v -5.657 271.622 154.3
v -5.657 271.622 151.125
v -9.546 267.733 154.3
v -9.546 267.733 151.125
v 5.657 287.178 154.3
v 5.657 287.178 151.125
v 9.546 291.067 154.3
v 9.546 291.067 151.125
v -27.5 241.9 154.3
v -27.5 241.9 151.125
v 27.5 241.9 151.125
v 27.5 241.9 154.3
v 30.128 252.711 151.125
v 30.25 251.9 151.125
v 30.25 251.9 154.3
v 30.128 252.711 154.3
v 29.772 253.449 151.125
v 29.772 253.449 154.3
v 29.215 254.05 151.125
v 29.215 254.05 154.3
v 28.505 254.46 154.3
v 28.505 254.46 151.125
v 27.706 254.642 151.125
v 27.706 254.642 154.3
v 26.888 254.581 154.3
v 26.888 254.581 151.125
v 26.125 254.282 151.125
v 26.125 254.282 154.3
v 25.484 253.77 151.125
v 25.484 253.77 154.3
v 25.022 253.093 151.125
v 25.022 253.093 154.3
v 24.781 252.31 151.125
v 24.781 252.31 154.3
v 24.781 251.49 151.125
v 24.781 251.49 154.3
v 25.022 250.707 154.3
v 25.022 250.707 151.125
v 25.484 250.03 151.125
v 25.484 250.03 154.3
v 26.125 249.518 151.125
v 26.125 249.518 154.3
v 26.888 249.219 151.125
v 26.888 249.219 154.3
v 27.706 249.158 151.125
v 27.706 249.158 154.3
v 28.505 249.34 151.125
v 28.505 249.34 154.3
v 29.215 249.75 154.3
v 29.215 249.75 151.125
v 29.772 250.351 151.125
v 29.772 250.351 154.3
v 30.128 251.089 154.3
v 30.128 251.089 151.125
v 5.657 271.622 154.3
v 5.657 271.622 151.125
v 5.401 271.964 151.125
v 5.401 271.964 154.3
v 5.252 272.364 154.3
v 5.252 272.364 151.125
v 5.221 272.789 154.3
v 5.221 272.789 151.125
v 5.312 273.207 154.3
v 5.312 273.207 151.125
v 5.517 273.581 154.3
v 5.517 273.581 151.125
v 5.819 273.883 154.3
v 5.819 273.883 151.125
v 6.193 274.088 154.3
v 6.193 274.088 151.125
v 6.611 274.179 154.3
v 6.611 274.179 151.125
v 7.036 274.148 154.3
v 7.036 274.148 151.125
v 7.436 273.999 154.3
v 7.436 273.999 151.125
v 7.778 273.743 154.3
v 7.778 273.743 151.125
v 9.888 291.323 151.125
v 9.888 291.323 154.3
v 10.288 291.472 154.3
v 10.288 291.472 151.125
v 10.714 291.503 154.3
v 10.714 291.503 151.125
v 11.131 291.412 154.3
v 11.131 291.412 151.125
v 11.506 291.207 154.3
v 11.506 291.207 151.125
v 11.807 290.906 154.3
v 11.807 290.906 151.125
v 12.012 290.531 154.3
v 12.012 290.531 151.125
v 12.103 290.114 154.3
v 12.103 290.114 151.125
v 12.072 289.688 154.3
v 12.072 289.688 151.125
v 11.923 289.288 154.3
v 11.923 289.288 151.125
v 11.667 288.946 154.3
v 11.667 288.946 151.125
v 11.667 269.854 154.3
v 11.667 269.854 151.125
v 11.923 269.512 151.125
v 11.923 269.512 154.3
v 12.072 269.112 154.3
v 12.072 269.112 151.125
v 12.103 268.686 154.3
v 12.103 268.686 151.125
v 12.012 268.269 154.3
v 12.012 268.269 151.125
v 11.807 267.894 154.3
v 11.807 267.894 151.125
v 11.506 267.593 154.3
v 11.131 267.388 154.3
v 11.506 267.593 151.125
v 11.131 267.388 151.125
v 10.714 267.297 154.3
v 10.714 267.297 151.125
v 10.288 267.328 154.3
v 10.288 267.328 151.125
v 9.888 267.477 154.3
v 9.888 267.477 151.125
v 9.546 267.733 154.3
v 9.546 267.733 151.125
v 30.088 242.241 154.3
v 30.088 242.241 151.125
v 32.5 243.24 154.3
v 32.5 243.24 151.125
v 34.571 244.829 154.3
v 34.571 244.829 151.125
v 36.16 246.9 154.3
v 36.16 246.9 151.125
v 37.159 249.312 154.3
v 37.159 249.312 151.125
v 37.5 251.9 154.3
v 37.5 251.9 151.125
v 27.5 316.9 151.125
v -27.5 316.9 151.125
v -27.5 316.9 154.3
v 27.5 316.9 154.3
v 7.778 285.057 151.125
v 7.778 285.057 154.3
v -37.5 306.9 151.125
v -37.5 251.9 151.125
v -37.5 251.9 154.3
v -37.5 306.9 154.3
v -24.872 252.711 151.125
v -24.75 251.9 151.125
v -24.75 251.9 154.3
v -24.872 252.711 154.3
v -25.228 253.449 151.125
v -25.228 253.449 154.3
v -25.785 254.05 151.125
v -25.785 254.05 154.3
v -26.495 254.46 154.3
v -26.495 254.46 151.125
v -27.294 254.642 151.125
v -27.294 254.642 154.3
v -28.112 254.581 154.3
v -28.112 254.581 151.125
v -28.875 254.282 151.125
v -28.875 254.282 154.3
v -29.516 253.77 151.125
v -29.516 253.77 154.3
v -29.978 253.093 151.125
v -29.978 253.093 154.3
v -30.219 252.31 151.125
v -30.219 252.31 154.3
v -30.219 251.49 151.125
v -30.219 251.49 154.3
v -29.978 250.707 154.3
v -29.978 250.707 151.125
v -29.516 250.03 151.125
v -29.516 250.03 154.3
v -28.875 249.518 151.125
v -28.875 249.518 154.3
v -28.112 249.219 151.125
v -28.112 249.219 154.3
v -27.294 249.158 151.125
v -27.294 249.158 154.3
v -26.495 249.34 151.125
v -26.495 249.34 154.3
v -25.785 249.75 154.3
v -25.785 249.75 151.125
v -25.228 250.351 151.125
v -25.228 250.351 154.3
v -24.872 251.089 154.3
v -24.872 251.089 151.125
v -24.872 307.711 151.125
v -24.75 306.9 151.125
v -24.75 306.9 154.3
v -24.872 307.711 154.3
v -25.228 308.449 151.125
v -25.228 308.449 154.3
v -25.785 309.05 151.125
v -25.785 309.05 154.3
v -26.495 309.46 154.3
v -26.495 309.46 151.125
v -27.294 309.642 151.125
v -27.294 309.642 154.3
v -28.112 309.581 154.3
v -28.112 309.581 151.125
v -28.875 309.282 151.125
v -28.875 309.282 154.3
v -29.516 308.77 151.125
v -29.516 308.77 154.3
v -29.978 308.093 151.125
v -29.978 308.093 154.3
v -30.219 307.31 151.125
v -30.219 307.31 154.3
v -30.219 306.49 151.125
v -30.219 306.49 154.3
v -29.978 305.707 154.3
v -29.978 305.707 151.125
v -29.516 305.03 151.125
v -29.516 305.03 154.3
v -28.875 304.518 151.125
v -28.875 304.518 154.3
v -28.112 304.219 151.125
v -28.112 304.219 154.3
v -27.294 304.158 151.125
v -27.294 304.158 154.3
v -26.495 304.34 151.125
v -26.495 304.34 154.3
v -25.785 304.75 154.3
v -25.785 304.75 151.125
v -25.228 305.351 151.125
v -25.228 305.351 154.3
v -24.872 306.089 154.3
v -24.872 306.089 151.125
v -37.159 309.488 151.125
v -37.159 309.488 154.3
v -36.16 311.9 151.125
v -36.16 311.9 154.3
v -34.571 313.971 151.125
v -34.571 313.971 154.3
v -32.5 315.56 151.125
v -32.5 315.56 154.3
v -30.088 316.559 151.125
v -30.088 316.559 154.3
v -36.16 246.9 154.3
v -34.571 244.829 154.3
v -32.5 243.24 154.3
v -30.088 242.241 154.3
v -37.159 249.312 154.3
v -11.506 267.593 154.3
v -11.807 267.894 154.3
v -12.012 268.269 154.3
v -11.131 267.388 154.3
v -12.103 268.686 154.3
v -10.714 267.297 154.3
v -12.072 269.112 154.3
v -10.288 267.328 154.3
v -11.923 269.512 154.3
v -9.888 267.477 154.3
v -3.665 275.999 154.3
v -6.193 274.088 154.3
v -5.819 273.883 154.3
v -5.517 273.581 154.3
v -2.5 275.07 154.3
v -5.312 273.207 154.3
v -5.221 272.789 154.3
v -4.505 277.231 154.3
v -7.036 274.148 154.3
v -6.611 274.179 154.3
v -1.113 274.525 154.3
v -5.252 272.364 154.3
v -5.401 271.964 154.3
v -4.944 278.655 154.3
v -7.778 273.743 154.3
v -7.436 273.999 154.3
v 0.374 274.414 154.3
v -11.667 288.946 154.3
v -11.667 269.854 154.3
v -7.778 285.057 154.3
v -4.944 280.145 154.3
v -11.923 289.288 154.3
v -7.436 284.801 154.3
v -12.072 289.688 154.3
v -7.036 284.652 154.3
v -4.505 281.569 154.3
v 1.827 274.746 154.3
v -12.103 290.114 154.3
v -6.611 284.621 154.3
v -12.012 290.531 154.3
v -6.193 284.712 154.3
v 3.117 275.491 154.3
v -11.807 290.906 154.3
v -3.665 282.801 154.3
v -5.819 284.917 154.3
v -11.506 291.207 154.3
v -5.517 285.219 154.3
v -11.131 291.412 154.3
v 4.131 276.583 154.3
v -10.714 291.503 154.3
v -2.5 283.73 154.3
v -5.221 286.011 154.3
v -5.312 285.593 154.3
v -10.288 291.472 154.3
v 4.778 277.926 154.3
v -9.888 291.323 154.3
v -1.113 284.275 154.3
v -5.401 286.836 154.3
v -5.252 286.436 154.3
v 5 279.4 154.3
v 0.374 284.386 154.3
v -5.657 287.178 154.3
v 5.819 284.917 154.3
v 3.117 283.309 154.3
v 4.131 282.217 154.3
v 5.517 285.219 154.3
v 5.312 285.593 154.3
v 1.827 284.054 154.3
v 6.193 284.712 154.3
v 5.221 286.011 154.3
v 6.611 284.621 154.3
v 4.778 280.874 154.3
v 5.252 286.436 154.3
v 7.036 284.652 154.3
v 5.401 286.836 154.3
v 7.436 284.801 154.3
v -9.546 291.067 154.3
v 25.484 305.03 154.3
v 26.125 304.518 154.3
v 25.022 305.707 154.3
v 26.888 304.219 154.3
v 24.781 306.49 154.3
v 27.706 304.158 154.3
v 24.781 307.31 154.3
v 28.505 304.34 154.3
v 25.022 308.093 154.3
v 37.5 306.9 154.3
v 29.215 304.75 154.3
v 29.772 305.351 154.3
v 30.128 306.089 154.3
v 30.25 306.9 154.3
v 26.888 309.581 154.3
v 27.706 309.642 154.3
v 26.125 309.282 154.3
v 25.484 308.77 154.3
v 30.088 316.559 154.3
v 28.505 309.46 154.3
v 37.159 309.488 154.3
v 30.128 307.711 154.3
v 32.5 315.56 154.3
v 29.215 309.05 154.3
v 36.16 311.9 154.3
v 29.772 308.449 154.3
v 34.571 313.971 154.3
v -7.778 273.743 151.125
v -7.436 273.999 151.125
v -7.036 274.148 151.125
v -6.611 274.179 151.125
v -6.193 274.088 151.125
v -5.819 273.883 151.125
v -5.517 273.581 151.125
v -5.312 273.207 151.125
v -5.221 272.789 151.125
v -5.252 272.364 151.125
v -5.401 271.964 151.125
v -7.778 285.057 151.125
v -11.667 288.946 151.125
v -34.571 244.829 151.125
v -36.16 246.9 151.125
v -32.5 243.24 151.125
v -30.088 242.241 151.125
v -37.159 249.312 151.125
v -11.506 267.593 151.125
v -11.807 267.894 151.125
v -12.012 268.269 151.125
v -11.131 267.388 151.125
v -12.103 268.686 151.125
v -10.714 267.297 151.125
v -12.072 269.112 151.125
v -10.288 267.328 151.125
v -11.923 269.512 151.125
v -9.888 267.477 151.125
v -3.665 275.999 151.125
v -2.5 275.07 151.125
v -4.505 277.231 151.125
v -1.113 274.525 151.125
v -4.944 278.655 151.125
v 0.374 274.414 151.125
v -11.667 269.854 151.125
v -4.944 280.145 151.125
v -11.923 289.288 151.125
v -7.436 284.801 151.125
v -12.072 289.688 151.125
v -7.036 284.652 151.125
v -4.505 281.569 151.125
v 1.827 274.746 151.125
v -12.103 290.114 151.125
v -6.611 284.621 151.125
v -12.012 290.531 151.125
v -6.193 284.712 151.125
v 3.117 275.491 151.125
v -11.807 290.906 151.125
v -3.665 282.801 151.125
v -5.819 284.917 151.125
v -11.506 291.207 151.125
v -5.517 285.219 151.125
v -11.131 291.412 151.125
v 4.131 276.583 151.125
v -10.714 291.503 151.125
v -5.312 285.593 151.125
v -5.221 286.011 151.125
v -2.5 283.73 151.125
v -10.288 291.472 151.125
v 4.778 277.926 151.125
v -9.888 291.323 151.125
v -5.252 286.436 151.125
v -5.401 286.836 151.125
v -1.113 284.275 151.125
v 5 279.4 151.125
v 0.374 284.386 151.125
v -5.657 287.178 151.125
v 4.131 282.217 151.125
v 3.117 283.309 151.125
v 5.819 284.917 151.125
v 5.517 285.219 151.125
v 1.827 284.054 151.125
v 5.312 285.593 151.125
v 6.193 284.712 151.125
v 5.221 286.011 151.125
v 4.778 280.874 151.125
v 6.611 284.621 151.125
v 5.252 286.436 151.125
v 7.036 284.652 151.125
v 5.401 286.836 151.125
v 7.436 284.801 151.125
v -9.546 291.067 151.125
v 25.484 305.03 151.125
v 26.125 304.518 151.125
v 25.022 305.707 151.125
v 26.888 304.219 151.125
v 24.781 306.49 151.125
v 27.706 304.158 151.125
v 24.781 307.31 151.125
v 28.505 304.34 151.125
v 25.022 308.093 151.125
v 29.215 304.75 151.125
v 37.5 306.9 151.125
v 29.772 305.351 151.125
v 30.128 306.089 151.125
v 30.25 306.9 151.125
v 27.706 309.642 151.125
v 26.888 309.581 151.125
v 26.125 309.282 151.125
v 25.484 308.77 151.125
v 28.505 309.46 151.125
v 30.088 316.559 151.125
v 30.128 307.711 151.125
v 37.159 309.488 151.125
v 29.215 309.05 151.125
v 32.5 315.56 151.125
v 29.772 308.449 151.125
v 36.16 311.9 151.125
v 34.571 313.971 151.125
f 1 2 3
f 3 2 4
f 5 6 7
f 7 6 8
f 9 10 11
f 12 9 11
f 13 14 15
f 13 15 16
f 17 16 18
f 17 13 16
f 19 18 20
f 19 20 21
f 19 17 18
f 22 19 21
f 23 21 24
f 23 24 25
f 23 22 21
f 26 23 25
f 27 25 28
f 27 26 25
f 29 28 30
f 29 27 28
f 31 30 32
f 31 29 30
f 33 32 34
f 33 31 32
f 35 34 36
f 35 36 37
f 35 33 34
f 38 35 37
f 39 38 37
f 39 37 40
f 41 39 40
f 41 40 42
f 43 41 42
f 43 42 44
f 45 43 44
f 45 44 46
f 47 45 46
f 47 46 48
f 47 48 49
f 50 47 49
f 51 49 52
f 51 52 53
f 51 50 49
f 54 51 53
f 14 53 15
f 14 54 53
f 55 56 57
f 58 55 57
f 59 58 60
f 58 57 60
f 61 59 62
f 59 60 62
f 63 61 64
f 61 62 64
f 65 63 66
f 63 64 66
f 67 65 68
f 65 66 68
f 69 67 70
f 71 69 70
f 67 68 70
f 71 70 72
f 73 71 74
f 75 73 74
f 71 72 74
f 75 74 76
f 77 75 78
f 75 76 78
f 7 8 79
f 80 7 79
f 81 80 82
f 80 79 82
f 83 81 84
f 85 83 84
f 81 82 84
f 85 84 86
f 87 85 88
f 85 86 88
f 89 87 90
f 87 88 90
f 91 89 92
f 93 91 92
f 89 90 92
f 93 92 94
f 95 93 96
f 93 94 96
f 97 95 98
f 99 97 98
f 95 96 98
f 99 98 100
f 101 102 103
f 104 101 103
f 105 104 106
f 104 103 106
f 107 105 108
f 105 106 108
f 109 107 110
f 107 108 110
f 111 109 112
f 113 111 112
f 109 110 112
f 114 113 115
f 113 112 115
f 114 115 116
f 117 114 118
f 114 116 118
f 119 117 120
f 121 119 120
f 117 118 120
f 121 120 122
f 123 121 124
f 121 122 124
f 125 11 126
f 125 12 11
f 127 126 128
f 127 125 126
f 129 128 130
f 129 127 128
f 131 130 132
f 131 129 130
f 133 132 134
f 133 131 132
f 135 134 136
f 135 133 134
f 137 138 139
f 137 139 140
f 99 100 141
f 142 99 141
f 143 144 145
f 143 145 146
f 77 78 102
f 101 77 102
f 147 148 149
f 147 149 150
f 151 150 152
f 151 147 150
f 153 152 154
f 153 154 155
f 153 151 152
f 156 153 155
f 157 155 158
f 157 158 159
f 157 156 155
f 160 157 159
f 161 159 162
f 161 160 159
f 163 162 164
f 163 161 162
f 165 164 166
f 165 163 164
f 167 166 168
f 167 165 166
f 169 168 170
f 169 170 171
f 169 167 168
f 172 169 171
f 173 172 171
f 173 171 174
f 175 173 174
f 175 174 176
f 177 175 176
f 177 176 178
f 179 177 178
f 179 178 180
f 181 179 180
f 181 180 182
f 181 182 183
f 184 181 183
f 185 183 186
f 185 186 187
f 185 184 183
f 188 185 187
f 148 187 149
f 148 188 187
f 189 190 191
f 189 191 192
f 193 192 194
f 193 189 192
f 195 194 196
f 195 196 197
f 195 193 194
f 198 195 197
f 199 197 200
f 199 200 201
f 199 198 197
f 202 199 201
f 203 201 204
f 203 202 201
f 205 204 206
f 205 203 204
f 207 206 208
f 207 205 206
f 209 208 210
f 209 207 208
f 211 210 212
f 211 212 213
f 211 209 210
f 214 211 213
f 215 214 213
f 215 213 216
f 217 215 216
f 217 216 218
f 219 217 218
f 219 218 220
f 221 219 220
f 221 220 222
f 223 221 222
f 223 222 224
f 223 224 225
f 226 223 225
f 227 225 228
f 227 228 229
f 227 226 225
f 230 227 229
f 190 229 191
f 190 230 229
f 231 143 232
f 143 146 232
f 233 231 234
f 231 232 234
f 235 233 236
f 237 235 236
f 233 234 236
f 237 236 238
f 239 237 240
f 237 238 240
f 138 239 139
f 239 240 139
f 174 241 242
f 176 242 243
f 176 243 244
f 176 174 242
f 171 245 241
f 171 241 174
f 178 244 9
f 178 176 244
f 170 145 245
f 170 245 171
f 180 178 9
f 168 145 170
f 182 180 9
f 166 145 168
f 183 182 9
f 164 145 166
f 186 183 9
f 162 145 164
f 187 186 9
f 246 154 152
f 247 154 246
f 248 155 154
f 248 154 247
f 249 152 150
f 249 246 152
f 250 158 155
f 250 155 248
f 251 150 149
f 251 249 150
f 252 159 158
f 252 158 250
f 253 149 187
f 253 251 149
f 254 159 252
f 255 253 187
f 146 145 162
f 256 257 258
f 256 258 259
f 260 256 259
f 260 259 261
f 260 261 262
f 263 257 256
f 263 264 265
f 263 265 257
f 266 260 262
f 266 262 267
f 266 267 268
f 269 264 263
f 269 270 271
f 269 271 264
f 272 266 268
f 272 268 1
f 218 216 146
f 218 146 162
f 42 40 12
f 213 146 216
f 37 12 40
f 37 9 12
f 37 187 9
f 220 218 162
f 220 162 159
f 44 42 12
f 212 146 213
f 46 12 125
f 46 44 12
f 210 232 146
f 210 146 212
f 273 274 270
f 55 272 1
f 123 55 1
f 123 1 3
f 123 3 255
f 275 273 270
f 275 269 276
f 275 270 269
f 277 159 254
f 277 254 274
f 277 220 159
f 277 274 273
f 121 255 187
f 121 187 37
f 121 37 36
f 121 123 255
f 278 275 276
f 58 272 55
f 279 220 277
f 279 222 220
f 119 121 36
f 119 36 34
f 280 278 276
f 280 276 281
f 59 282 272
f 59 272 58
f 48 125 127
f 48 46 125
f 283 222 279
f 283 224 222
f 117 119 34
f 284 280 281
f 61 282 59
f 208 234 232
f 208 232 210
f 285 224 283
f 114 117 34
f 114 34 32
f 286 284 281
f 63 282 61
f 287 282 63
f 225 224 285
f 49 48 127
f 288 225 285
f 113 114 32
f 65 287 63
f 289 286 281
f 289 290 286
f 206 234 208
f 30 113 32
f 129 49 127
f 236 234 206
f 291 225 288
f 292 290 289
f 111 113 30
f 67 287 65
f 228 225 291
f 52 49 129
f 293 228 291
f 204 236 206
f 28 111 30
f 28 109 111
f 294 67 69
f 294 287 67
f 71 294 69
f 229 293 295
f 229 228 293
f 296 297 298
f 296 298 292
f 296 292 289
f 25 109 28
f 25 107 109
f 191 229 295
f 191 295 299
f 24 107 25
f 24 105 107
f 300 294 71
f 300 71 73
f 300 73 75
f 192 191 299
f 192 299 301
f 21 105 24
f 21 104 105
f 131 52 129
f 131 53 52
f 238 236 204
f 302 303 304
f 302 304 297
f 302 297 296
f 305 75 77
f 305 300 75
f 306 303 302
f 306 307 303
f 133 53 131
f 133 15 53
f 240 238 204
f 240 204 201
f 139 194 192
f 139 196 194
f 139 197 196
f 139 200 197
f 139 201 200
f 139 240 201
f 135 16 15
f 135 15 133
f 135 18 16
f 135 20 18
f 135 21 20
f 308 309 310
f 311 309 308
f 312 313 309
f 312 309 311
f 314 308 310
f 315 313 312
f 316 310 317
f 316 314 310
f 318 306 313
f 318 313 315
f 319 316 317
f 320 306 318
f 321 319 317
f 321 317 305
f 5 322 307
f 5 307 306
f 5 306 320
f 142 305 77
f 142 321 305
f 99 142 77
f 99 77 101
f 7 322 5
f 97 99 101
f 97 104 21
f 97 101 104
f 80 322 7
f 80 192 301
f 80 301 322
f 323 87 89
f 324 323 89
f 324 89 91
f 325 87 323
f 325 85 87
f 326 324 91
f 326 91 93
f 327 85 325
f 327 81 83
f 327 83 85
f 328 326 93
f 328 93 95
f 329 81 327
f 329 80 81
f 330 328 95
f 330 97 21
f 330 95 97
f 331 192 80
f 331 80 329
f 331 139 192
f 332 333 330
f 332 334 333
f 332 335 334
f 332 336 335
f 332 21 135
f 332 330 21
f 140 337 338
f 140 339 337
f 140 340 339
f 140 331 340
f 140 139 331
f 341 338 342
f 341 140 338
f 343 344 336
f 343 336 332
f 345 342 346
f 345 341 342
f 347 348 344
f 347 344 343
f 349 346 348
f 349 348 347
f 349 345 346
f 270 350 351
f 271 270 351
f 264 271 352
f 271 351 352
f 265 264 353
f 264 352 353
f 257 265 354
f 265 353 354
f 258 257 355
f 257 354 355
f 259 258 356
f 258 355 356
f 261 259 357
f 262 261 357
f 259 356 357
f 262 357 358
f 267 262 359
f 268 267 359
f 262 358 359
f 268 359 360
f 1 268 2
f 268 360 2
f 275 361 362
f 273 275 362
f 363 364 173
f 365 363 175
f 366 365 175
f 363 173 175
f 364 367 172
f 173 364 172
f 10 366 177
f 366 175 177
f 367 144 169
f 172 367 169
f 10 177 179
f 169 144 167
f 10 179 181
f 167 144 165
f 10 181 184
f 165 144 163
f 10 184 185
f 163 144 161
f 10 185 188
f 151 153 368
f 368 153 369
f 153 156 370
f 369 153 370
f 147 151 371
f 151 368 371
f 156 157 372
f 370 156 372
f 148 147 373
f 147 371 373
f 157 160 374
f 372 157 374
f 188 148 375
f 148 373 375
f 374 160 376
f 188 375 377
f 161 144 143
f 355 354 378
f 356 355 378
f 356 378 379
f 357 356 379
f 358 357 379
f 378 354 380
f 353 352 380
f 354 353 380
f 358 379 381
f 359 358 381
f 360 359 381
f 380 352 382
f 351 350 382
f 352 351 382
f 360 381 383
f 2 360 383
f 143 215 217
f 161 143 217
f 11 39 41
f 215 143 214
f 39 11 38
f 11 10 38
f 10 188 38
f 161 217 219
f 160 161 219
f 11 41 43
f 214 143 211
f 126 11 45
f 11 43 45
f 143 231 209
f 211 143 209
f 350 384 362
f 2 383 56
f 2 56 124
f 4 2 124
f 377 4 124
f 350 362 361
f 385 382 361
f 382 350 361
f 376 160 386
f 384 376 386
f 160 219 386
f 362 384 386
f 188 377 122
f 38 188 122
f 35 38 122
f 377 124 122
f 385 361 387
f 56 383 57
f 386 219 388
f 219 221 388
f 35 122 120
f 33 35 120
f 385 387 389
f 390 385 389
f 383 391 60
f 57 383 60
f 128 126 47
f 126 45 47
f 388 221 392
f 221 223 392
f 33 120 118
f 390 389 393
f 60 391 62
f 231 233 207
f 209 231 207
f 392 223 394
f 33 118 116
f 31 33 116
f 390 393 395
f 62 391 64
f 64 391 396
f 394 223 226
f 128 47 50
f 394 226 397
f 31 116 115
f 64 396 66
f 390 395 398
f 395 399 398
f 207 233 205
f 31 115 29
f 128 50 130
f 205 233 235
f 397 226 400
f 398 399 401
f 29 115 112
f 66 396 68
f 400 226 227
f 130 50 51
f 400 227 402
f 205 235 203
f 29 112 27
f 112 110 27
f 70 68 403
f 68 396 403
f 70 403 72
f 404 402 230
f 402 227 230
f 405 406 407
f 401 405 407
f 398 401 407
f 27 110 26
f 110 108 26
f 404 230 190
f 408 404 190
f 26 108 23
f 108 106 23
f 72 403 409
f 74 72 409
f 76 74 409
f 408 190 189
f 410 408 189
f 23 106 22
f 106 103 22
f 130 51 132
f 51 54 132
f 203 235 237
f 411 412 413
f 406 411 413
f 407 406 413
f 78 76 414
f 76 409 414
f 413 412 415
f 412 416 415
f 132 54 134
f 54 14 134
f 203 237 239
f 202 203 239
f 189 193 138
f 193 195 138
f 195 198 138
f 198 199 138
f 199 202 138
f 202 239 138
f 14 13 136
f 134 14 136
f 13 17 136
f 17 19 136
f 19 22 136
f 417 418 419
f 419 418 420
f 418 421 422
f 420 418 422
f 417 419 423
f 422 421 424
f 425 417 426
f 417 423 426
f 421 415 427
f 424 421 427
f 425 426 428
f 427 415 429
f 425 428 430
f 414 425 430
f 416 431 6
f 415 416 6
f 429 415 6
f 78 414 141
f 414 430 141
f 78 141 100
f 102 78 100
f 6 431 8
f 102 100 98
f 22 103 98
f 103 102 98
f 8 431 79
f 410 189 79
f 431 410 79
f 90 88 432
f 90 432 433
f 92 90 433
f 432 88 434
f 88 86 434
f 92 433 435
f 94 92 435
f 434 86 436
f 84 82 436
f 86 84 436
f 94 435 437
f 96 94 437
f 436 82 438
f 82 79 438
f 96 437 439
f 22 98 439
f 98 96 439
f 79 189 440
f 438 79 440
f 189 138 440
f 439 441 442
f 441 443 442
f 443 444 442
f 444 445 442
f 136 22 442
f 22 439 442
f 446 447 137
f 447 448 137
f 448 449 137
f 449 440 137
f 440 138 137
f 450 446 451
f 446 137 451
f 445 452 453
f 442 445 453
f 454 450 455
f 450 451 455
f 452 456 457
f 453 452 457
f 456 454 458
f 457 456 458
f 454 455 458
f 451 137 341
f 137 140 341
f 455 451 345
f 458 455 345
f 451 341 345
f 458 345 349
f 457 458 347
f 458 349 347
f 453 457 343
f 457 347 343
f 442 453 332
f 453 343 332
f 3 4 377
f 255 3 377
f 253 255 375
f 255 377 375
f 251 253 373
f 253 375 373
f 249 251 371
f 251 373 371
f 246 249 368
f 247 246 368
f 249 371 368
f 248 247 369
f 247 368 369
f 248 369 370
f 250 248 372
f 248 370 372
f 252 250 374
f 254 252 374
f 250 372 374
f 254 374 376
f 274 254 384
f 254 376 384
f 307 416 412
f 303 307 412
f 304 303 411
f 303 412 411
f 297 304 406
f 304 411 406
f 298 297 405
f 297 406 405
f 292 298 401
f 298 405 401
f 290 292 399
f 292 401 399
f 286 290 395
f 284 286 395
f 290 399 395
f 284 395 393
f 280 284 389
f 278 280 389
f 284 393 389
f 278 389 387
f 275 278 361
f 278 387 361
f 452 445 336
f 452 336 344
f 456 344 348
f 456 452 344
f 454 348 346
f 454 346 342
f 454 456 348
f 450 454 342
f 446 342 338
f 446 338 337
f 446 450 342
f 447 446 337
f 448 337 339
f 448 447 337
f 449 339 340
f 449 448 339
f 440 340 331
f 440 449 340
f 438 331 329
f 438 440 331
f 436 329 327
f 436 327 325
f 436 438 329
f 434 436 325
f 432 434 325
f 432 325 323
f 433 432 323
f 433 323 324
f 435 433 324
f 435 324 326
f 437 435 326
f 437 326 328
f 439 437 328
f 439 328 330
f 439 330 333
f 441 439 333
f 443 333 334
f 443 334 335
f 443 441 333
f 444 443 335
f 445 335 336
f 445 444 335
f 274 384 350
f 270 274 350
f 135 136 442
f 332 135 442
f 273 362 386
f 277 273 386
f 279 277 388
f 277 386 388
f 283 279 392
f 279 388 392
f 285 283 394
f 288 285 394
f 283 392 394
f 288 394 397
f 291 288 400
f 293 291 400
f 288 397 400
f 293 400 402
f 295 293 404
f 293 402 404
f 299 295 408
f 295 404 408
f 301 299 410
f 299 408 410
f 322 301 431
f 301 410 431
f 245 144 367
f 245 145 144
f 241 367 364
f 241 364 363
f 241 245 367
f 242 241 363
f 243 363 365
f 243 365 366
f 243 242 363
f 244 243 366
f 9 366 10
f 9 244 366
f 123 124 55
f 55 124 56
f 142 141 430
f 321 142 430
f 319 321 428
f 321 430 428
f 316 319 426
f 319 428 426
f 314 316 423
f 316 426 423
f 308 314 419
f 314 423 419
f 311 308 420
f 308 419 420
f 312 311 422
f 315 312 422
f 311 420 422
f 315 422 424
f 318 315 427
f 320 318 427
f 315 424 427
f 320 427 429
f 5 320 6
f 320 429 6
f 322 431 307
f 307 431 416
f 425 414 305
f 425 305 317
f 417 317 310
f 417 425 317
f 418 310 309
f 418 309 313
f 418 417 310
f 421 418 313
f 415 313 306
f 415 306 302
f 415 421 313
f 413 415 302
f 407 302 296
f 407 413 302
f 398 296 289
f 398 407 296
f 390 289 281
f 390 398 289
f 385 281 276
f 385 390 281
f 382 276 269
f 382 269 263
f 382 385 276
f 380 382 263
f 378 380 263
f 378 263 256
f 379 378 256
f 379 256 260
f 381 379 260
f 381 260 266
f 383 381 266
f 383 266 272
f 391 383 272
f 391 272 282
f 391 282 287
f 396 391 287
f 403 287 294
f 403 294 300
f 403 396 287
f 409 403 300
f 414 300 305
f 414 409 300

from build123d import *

# Parameters (mm, degrees)
SKETCH1_W               = 75
SKETCH1_H               = 75
SKETCH1_R               = 2.75
SKETCH1_R_2             = 5
BOSS_EXTRUDE1_DEPTH     = 3.175
CUT_EXTRUDE1_DEPTH      = 320.126840966
CUT_EXTRUDE1_DEPTH_BACK = 320.126840966
FILLET1_R               = 10


with BuildPart() as part:
    # Sketch1 → Boss-Extrude1 (new body)
    with BuildSketch(Plane.XY.offset(151.125)):
        with Locations((0, 279.4)):
            Rectangle(SKETCH1_W, SKETCH1_H)
        with Locations((-27.5, 251.9)):
            Circle(SKETCH1_R, mode=Mode.SUBTRACT)
        with Locations((27.5, 251.9)):
            Circle(SKETCH1_R, mode=Mode.SUBTRACT)
        with Locations((27.5, 306.9)):
            Circle(SKETCH1_R, mode=Mode.SUBTRACT)
        with Locations((-27.5, 306.9)):
            Circle(SKETCH1_R, mode=Mode.SUBTRACT)
        with Locations((0, 279.4)):
            Circle(SKETCH1_R_2, mode=Mode.SUBTRACT)
    extrude(amount=BOSS_EXTRUDE1_DEPTH)

    # Sketch2 → Cut-Extrude1 (cut, two sides: drawn at the far end of the back side and taken through both)
    with BuildSketch(Plane.XY.offset(154.3).offset(-CUT_EXTRUDE1_DEPTH_BACK)):
        with BuildLine():
            Line((5.656854249, 287.178174593), (9.545941546, 291.06726189))
            ThreePointArc((9.545941546, 291.06726189), (11.66726189, 291.06726189), (11.66726189, 288.945941546))
            Line((11.66726189, 288.945941546), (7.778174593, 285.056854249))
            ThreePointArc((7.778174593, 285.056854249), (5.656854249, 285.056854249), (5.656854249, 287.178174593))
        make_face()
        with BuildLine():
            Line((7.778174593, 273.743145751), (11.66726189, 269.854058454))
            ThreePointArc((11.66726189, 269.854058454), (11.66726189, 267.73273811), (9.545941546, 267.73273811))
            Line((9.545941546, 267.73273811), (5.656854249, 271.621825407))
            ThreePointArc((5.656854249, 271.621825407), (5.656854249, 273.743145751), (7.778174593, 273.743145751))
        make_face()
        with BuildLine():
            Line((-5.656854249, 271.621825407), (-9.545941546, 267.73273811))
            ThreePointArc((-9.545941546, 267.73273811), (-11.66726189, 267.73273811), (-11.66726189, 269.854058454))
            Line((-11.66726189, 269.854058454), (-7.778174593, 273.743145751))
            ThreePointArc((-7.778174593, 273.743145751), (-5.656854249, 273.743145751), (-5.656854249, 271.621825407))
        make_face()
        with BuildLine():
            Line((-7.778174593, 285.056854249), (-11.66726189, 288.945941546))
            ThreePointArc((-11.66726189, 288.945941546), (-11.66726189, 291.06726189), (-9.545941546, 291.06726189))
            Line((-9.545941546, 291.06726189), (-5.656854249, 287.178174593))
            ThreePointArc((-5.656854249, 287.178174593), (-5.656854249, 285.056854249), (-7.778174593, 285.056854249))
        make_face()
    extrude(amount=CUT_EXTRUDE1_DEPTH + CUT_EXTRUDE1_DEPTH_BACK, mode=Mode.SUBTRACT)

    # Fillet1
    fillet1_edges = [part.edges().sort_by_distance(p)[0] for p in [
        (37.5, 241.9, 152.7125),
        (-37.5, 241.9, 152.7125),
        (-37.5, 316.9, 152.7125),
        (37.5, 316.9, 152.7125),
    ]]
    fillet(fillet1_edges, radius=FILLET1_R)


solid = part.part
